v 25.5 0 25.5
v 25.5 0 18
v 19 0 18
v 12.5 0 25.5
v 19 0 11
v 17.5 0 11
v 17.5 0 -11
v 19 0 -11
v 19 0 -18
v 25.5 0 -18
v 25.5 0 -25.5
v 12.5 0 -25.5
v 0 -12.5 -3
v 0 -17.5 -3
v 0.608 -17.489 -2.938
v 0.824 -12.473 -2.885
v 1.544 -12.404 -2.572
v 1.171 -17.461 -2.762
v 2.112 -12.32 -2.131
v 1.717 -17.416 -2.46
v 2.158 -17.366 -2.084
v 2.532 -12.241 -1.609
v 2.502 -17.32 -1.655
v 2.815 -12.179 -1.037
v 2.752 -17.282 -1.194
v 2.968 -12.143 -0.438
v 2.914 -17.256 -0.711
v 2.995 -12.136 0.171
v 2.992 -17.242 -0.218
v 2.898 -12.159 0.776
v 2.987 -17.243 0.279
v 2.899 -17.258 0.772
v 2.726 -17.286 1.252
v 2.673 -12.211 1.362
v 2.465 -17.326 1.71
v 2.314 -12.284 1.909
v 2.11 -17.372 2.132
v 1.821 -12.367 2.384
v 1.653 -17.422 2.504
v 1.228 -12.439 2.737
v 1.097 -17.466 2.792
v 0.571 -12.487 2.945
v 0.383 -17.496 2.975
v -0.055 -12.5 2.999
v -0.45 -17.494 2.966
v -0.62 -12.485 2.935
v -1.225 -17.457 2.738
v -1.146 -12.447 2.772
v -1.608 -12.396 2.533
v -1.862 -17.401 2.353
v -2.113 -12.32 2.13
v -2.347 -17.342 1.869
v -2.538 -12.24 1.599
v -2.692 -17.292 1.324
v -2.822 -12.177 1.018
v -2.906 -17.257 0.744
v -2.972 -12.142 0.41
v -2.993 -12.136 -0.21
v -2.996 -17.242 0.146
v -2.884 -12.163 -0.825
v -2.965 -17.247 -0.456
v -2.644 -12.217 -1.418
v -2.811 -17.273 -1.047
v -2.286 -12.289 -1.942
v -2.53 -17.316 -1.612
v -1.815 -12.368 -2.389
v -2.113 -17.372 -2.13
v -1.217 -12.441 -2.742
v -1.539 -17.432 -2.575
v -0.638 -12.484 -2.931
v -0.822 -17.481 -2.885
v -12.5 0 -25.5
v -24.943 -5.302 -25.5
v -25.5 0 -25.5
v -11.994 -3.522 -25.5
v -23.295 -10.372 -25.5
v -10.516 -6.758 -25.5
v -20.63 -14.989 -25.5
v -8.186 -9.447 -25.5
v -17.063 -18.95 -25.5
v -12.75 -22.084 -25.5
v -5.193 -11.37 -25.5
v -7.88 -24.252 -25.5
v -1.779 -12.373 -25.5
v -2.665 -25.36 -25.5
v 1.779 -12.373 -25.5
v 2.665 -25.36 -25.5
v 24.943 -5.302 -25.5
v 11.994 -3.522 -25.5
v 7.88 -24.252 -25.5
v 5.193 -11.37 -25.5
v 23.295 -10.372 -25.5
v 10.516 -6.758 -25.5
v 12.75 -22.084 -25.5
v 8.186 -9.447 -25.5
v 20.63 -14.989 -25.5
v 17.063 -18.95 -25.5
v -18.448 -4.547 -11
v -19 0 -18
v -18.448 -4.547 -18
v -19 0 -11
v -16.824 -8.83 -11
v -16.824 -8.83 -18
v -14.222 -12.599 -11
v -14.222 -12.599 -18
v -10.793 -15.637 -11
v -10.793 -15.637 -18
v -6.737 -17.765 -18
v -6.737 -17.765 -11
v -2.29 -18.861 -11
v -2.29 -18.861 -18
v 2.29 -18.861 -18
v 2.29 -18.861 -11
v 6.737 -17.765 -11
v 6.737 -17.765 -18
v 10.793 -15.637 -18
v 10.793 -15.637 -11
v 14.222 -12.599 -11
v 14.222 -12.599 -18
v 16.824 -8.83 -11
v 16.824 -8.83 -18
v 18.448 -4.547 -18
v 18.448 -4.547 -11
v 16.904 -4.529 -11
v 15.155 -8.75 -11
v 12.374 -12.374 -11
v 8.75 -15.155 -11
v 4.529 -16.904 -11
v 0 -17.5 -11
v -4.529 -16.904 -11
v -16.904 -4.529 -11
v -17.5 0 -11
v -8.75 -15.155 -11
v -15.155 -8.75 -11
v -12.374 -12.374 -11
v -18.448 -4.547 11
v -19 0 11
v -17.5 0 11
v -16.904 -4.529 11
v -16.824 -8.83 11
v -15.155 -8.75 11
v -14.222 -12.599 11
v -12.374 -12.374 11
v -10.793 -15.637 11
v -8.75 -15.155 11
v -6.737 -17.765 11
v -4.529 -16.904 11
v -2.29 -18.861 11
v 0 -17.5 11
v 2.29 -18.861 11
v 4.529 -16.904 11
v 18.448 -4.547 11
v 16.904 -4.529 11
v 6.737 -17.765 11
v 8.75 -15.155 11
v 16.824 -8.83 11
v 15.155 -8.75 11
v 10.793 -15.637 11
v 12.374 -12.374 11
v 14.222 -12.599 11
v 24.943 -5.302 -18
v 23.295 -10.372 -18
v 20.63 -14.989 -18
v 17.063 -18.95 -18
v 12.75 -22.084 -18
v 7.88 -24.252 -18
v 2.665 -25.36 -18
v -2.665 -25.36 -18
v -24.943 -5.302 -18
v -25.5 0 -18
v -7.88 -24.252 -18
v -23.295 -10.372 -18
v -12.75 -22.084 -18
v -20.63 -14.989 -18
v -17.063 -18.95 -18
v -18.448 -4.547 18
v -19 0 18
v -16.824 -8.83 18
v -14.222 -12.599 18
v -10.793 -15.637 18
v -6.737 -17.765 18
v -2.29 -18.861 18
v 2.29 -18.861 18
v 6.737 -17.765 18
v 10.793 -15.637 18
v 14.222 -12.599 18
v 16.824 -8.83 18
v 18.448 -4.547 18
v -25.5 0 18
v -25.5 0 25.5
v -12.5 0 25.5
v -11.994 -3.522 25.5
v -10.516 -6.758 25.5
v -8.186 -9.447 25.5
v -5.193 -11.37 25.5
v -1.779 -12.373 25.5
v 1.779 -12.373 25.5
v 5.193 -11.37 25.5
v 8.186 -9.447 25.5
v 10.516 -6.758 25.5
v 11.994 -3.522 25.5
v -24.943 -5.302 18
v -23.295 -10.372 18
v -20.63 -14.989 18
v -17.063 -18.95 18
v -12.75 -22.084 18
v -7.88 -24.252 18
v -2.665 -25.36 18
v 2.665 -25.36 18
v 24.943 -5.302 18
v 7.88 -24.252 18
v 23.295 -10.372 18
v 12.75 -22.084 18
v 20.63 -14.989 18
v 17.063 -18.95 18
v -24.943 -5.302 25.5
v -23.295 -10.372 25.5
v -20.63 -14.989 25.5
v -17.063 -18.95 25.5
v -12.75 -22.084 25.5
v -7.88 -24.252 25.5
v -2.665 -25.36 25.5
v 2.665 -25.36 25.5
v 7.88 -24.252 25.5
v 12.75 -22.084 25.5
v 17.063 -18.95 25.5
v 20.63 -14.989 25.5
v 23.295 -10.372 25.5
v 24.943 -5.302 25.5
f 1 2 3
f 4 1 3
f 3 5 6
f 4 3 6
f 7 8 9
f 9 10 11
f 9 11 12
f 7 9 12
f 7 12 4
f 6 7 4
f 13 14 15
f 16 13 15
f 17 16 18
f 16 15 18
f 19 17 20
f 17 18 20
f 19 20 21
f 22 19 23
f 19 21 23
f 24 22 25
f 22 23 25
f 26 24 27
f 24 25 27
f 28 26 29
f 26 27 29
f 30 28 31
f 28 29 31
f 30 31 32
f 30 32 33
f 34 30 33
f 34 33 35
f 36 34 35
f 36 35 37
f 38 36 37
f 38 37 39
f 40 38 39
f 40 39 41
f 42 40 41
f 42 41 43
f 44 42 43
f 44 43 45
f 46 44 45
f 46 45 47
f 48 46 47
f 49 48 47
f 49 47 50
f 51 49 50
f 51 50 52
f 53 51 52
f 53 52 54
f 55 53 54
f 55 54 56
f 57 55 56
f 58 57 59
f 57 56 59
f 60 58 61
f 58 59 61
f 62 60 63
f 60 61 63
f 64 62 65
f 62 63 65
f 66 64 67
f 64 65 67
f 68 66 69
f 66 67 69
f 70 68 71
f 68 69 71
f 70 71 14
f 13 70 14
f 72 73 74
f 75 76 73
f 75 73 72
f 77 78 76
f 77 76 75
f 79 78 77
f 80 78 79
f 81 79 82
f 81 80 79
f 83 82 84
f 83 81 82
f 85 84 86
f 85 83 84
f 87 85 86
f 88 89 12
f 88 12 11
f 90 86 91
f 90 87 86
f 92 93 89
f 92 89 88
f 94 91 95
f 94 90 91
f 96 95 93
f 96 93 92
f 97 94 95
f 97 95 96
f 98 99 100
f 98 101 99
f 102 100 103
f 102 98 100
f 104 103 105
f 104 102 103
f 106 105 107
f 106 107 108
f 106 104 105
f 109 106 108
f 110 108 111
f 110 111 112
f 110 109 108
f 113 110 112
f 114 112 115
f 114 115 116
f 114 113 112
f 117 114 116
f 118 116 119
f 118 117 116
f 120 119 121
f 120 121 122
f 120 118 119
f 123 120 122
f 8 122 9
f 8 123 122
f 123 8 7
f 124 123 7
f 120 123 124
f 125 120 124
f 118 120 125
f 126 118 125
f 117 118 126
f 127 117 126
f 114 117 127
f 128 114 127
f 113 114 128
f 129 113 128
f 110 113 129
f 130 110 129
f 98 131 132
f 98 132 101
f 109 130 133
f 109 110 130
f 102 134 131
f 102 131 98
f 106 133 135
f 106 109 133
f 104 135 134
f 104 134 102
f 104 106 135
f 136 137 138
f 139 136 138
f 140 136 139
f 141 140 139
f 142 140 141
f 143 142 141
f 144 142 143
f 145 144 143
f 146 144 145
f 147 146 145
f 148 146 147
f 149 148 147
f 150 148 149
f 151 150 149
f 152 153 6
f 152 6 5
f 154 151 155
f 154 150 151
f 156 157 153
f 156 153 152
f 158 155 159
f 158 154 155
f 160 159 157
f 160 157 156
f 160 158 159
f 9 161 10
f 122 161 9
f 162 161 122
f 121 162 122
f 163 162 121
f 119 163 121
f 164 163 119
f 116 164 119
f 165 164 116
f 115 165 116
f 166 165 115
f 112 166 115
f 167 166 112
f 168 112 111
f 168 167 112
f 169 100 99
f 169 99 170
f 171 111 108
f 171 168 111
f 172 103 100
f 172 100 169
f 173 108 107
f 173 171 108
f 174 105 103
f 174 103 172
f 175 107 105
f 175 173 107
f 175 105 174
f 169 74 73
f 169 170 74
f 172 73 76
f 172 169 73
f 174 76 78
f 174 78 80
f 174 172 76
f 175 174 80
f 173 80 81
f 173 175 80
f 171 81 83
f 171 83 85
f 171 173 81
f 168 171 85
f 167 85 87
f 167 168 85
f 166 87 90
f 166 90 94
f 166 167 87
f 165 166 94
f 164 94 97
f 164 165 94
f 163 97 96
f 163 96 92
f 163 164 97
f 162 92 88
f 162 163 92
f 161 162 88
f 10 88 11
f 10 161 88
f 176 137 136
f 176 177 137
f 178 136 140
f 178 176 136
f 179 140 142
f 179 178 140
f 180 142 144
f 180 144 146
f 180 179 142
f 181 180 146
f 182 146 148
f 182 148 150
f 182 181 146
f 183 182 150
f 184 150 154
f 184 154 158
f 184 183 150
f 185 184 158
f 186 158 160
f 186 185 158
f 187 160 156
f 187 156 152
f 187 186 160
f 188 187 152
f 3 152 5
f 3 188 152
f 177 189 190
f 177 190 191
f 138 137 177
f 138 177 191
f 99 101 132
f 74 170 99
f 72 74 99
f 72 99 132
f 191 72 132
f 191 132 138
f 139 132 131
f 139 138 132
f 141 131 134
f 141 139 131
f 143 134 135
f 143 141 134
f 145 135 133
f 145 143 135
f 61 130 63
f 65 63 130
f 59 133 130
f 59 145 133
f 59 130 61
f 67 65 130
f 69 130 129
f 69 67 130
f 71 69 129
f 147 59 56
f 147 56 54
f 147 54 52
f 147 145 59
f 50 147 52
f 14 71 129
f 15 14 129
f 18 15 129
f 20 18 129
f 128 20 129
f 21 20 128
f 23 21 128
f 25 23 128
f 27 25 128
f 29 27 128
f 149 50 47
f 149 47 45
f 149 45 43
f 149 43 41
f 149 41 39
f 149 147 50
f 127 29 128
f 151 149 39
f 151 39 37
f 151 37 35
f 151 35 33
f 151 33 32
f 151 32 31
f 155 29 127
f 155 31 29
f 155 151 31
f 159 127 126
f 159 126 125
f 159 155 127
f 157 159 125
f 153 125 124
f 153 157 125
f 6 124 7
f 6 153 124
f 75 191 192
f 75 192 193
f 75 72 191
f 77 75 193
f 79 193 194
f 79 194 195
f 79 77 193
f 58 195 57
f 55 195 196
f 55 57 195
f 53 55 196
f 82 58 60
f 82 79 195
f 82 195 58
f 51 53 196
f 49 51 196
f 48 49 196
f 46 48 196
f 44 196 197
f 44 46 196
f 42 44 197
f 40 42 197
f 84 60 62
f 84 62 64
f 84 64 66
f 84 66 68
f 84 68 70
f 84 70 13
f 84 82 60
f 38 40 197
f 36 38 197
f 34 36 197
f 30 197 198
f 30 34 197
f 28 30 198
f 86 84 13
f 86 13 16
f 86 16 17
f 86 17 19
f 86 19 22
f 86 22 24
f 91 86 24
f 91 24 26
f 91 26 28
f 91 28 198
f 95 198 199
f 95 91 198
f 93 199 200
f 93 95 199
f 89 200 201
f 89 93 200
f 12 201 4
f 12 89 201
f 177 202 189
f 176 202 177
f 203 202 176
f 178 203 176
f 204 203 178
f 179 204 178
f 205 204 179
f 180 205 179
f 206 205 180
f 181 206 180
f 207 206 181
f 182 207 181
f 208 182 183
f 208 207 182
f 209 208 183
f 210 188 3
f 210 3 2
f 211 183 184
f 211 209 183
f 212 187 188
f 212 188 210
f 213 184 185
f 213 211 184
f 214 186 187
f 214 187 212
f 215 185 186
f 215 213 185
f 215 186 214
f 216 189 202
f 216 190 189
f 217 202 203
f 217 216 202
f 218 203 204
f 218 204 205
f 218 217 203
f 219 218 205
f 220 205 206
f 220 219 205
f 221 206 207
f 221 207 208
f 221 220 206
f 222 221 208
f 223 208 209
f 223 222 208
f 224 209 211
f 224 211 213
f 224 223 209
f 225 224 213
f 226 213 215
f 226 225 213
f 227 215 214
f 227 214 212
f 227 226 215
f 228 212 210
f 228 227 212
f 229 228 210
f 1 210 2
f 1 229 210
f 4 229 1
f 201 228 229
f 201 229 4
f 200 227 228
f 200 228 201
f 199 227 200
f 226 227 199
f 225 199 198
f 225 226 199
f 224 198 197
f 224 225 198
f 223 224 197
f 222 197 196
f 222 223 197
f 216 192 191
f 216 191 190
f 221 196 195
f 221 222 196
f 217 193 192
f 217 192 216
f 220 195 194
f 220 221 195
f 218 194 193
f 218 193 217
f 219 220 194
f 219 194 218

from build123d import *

# Parameters (mm, degrees)
REVOLVE1_ANGLE     = 180
SKETCH2_R          = 3
CUT_EXTRUDE1_DEPTH = 18.5


with BuildPart() as part:
    # Sketch1 → Revolve1 (revolve)
    with BuildSketch(Plane(origin=(0, 0, 0), x_dir=(1, 0, 0), z_dir=(0, 1, 0))):
        Polygon((-25.5, 25.5), (-25.5, 18), (-19, 18), (-19, 11), (-17.5, 11), (-17.5, -11), (-19, -11), (-19, -18), (-25.5, -18), (-25.5, -25.5), (-12.5, -25.5), (-12.5, 25.5), align=None)
    revolve(axis=Axis((0, 0, 0), (0, 0, 1)), revolution_arc=REVOLVE1_ANGLE)

    # Sketch2 → Cut-Extrude1 (cut, through all)
    with BuildSketch(Plane(origin=(0, -17.5, 0), x_dir=(-1, 0, 0), z_dir=(0, -1, 0))):
        with Locations(Location((0, 0, 0), (0, 0, 90))):  # turned: the seam where the file's is
            Circle(SKETCH2_R)
    extrude(amount=-CUT_EXTRUDE1_DEPTH, mode=Mode.SUBTRACT)


solid = part.part
